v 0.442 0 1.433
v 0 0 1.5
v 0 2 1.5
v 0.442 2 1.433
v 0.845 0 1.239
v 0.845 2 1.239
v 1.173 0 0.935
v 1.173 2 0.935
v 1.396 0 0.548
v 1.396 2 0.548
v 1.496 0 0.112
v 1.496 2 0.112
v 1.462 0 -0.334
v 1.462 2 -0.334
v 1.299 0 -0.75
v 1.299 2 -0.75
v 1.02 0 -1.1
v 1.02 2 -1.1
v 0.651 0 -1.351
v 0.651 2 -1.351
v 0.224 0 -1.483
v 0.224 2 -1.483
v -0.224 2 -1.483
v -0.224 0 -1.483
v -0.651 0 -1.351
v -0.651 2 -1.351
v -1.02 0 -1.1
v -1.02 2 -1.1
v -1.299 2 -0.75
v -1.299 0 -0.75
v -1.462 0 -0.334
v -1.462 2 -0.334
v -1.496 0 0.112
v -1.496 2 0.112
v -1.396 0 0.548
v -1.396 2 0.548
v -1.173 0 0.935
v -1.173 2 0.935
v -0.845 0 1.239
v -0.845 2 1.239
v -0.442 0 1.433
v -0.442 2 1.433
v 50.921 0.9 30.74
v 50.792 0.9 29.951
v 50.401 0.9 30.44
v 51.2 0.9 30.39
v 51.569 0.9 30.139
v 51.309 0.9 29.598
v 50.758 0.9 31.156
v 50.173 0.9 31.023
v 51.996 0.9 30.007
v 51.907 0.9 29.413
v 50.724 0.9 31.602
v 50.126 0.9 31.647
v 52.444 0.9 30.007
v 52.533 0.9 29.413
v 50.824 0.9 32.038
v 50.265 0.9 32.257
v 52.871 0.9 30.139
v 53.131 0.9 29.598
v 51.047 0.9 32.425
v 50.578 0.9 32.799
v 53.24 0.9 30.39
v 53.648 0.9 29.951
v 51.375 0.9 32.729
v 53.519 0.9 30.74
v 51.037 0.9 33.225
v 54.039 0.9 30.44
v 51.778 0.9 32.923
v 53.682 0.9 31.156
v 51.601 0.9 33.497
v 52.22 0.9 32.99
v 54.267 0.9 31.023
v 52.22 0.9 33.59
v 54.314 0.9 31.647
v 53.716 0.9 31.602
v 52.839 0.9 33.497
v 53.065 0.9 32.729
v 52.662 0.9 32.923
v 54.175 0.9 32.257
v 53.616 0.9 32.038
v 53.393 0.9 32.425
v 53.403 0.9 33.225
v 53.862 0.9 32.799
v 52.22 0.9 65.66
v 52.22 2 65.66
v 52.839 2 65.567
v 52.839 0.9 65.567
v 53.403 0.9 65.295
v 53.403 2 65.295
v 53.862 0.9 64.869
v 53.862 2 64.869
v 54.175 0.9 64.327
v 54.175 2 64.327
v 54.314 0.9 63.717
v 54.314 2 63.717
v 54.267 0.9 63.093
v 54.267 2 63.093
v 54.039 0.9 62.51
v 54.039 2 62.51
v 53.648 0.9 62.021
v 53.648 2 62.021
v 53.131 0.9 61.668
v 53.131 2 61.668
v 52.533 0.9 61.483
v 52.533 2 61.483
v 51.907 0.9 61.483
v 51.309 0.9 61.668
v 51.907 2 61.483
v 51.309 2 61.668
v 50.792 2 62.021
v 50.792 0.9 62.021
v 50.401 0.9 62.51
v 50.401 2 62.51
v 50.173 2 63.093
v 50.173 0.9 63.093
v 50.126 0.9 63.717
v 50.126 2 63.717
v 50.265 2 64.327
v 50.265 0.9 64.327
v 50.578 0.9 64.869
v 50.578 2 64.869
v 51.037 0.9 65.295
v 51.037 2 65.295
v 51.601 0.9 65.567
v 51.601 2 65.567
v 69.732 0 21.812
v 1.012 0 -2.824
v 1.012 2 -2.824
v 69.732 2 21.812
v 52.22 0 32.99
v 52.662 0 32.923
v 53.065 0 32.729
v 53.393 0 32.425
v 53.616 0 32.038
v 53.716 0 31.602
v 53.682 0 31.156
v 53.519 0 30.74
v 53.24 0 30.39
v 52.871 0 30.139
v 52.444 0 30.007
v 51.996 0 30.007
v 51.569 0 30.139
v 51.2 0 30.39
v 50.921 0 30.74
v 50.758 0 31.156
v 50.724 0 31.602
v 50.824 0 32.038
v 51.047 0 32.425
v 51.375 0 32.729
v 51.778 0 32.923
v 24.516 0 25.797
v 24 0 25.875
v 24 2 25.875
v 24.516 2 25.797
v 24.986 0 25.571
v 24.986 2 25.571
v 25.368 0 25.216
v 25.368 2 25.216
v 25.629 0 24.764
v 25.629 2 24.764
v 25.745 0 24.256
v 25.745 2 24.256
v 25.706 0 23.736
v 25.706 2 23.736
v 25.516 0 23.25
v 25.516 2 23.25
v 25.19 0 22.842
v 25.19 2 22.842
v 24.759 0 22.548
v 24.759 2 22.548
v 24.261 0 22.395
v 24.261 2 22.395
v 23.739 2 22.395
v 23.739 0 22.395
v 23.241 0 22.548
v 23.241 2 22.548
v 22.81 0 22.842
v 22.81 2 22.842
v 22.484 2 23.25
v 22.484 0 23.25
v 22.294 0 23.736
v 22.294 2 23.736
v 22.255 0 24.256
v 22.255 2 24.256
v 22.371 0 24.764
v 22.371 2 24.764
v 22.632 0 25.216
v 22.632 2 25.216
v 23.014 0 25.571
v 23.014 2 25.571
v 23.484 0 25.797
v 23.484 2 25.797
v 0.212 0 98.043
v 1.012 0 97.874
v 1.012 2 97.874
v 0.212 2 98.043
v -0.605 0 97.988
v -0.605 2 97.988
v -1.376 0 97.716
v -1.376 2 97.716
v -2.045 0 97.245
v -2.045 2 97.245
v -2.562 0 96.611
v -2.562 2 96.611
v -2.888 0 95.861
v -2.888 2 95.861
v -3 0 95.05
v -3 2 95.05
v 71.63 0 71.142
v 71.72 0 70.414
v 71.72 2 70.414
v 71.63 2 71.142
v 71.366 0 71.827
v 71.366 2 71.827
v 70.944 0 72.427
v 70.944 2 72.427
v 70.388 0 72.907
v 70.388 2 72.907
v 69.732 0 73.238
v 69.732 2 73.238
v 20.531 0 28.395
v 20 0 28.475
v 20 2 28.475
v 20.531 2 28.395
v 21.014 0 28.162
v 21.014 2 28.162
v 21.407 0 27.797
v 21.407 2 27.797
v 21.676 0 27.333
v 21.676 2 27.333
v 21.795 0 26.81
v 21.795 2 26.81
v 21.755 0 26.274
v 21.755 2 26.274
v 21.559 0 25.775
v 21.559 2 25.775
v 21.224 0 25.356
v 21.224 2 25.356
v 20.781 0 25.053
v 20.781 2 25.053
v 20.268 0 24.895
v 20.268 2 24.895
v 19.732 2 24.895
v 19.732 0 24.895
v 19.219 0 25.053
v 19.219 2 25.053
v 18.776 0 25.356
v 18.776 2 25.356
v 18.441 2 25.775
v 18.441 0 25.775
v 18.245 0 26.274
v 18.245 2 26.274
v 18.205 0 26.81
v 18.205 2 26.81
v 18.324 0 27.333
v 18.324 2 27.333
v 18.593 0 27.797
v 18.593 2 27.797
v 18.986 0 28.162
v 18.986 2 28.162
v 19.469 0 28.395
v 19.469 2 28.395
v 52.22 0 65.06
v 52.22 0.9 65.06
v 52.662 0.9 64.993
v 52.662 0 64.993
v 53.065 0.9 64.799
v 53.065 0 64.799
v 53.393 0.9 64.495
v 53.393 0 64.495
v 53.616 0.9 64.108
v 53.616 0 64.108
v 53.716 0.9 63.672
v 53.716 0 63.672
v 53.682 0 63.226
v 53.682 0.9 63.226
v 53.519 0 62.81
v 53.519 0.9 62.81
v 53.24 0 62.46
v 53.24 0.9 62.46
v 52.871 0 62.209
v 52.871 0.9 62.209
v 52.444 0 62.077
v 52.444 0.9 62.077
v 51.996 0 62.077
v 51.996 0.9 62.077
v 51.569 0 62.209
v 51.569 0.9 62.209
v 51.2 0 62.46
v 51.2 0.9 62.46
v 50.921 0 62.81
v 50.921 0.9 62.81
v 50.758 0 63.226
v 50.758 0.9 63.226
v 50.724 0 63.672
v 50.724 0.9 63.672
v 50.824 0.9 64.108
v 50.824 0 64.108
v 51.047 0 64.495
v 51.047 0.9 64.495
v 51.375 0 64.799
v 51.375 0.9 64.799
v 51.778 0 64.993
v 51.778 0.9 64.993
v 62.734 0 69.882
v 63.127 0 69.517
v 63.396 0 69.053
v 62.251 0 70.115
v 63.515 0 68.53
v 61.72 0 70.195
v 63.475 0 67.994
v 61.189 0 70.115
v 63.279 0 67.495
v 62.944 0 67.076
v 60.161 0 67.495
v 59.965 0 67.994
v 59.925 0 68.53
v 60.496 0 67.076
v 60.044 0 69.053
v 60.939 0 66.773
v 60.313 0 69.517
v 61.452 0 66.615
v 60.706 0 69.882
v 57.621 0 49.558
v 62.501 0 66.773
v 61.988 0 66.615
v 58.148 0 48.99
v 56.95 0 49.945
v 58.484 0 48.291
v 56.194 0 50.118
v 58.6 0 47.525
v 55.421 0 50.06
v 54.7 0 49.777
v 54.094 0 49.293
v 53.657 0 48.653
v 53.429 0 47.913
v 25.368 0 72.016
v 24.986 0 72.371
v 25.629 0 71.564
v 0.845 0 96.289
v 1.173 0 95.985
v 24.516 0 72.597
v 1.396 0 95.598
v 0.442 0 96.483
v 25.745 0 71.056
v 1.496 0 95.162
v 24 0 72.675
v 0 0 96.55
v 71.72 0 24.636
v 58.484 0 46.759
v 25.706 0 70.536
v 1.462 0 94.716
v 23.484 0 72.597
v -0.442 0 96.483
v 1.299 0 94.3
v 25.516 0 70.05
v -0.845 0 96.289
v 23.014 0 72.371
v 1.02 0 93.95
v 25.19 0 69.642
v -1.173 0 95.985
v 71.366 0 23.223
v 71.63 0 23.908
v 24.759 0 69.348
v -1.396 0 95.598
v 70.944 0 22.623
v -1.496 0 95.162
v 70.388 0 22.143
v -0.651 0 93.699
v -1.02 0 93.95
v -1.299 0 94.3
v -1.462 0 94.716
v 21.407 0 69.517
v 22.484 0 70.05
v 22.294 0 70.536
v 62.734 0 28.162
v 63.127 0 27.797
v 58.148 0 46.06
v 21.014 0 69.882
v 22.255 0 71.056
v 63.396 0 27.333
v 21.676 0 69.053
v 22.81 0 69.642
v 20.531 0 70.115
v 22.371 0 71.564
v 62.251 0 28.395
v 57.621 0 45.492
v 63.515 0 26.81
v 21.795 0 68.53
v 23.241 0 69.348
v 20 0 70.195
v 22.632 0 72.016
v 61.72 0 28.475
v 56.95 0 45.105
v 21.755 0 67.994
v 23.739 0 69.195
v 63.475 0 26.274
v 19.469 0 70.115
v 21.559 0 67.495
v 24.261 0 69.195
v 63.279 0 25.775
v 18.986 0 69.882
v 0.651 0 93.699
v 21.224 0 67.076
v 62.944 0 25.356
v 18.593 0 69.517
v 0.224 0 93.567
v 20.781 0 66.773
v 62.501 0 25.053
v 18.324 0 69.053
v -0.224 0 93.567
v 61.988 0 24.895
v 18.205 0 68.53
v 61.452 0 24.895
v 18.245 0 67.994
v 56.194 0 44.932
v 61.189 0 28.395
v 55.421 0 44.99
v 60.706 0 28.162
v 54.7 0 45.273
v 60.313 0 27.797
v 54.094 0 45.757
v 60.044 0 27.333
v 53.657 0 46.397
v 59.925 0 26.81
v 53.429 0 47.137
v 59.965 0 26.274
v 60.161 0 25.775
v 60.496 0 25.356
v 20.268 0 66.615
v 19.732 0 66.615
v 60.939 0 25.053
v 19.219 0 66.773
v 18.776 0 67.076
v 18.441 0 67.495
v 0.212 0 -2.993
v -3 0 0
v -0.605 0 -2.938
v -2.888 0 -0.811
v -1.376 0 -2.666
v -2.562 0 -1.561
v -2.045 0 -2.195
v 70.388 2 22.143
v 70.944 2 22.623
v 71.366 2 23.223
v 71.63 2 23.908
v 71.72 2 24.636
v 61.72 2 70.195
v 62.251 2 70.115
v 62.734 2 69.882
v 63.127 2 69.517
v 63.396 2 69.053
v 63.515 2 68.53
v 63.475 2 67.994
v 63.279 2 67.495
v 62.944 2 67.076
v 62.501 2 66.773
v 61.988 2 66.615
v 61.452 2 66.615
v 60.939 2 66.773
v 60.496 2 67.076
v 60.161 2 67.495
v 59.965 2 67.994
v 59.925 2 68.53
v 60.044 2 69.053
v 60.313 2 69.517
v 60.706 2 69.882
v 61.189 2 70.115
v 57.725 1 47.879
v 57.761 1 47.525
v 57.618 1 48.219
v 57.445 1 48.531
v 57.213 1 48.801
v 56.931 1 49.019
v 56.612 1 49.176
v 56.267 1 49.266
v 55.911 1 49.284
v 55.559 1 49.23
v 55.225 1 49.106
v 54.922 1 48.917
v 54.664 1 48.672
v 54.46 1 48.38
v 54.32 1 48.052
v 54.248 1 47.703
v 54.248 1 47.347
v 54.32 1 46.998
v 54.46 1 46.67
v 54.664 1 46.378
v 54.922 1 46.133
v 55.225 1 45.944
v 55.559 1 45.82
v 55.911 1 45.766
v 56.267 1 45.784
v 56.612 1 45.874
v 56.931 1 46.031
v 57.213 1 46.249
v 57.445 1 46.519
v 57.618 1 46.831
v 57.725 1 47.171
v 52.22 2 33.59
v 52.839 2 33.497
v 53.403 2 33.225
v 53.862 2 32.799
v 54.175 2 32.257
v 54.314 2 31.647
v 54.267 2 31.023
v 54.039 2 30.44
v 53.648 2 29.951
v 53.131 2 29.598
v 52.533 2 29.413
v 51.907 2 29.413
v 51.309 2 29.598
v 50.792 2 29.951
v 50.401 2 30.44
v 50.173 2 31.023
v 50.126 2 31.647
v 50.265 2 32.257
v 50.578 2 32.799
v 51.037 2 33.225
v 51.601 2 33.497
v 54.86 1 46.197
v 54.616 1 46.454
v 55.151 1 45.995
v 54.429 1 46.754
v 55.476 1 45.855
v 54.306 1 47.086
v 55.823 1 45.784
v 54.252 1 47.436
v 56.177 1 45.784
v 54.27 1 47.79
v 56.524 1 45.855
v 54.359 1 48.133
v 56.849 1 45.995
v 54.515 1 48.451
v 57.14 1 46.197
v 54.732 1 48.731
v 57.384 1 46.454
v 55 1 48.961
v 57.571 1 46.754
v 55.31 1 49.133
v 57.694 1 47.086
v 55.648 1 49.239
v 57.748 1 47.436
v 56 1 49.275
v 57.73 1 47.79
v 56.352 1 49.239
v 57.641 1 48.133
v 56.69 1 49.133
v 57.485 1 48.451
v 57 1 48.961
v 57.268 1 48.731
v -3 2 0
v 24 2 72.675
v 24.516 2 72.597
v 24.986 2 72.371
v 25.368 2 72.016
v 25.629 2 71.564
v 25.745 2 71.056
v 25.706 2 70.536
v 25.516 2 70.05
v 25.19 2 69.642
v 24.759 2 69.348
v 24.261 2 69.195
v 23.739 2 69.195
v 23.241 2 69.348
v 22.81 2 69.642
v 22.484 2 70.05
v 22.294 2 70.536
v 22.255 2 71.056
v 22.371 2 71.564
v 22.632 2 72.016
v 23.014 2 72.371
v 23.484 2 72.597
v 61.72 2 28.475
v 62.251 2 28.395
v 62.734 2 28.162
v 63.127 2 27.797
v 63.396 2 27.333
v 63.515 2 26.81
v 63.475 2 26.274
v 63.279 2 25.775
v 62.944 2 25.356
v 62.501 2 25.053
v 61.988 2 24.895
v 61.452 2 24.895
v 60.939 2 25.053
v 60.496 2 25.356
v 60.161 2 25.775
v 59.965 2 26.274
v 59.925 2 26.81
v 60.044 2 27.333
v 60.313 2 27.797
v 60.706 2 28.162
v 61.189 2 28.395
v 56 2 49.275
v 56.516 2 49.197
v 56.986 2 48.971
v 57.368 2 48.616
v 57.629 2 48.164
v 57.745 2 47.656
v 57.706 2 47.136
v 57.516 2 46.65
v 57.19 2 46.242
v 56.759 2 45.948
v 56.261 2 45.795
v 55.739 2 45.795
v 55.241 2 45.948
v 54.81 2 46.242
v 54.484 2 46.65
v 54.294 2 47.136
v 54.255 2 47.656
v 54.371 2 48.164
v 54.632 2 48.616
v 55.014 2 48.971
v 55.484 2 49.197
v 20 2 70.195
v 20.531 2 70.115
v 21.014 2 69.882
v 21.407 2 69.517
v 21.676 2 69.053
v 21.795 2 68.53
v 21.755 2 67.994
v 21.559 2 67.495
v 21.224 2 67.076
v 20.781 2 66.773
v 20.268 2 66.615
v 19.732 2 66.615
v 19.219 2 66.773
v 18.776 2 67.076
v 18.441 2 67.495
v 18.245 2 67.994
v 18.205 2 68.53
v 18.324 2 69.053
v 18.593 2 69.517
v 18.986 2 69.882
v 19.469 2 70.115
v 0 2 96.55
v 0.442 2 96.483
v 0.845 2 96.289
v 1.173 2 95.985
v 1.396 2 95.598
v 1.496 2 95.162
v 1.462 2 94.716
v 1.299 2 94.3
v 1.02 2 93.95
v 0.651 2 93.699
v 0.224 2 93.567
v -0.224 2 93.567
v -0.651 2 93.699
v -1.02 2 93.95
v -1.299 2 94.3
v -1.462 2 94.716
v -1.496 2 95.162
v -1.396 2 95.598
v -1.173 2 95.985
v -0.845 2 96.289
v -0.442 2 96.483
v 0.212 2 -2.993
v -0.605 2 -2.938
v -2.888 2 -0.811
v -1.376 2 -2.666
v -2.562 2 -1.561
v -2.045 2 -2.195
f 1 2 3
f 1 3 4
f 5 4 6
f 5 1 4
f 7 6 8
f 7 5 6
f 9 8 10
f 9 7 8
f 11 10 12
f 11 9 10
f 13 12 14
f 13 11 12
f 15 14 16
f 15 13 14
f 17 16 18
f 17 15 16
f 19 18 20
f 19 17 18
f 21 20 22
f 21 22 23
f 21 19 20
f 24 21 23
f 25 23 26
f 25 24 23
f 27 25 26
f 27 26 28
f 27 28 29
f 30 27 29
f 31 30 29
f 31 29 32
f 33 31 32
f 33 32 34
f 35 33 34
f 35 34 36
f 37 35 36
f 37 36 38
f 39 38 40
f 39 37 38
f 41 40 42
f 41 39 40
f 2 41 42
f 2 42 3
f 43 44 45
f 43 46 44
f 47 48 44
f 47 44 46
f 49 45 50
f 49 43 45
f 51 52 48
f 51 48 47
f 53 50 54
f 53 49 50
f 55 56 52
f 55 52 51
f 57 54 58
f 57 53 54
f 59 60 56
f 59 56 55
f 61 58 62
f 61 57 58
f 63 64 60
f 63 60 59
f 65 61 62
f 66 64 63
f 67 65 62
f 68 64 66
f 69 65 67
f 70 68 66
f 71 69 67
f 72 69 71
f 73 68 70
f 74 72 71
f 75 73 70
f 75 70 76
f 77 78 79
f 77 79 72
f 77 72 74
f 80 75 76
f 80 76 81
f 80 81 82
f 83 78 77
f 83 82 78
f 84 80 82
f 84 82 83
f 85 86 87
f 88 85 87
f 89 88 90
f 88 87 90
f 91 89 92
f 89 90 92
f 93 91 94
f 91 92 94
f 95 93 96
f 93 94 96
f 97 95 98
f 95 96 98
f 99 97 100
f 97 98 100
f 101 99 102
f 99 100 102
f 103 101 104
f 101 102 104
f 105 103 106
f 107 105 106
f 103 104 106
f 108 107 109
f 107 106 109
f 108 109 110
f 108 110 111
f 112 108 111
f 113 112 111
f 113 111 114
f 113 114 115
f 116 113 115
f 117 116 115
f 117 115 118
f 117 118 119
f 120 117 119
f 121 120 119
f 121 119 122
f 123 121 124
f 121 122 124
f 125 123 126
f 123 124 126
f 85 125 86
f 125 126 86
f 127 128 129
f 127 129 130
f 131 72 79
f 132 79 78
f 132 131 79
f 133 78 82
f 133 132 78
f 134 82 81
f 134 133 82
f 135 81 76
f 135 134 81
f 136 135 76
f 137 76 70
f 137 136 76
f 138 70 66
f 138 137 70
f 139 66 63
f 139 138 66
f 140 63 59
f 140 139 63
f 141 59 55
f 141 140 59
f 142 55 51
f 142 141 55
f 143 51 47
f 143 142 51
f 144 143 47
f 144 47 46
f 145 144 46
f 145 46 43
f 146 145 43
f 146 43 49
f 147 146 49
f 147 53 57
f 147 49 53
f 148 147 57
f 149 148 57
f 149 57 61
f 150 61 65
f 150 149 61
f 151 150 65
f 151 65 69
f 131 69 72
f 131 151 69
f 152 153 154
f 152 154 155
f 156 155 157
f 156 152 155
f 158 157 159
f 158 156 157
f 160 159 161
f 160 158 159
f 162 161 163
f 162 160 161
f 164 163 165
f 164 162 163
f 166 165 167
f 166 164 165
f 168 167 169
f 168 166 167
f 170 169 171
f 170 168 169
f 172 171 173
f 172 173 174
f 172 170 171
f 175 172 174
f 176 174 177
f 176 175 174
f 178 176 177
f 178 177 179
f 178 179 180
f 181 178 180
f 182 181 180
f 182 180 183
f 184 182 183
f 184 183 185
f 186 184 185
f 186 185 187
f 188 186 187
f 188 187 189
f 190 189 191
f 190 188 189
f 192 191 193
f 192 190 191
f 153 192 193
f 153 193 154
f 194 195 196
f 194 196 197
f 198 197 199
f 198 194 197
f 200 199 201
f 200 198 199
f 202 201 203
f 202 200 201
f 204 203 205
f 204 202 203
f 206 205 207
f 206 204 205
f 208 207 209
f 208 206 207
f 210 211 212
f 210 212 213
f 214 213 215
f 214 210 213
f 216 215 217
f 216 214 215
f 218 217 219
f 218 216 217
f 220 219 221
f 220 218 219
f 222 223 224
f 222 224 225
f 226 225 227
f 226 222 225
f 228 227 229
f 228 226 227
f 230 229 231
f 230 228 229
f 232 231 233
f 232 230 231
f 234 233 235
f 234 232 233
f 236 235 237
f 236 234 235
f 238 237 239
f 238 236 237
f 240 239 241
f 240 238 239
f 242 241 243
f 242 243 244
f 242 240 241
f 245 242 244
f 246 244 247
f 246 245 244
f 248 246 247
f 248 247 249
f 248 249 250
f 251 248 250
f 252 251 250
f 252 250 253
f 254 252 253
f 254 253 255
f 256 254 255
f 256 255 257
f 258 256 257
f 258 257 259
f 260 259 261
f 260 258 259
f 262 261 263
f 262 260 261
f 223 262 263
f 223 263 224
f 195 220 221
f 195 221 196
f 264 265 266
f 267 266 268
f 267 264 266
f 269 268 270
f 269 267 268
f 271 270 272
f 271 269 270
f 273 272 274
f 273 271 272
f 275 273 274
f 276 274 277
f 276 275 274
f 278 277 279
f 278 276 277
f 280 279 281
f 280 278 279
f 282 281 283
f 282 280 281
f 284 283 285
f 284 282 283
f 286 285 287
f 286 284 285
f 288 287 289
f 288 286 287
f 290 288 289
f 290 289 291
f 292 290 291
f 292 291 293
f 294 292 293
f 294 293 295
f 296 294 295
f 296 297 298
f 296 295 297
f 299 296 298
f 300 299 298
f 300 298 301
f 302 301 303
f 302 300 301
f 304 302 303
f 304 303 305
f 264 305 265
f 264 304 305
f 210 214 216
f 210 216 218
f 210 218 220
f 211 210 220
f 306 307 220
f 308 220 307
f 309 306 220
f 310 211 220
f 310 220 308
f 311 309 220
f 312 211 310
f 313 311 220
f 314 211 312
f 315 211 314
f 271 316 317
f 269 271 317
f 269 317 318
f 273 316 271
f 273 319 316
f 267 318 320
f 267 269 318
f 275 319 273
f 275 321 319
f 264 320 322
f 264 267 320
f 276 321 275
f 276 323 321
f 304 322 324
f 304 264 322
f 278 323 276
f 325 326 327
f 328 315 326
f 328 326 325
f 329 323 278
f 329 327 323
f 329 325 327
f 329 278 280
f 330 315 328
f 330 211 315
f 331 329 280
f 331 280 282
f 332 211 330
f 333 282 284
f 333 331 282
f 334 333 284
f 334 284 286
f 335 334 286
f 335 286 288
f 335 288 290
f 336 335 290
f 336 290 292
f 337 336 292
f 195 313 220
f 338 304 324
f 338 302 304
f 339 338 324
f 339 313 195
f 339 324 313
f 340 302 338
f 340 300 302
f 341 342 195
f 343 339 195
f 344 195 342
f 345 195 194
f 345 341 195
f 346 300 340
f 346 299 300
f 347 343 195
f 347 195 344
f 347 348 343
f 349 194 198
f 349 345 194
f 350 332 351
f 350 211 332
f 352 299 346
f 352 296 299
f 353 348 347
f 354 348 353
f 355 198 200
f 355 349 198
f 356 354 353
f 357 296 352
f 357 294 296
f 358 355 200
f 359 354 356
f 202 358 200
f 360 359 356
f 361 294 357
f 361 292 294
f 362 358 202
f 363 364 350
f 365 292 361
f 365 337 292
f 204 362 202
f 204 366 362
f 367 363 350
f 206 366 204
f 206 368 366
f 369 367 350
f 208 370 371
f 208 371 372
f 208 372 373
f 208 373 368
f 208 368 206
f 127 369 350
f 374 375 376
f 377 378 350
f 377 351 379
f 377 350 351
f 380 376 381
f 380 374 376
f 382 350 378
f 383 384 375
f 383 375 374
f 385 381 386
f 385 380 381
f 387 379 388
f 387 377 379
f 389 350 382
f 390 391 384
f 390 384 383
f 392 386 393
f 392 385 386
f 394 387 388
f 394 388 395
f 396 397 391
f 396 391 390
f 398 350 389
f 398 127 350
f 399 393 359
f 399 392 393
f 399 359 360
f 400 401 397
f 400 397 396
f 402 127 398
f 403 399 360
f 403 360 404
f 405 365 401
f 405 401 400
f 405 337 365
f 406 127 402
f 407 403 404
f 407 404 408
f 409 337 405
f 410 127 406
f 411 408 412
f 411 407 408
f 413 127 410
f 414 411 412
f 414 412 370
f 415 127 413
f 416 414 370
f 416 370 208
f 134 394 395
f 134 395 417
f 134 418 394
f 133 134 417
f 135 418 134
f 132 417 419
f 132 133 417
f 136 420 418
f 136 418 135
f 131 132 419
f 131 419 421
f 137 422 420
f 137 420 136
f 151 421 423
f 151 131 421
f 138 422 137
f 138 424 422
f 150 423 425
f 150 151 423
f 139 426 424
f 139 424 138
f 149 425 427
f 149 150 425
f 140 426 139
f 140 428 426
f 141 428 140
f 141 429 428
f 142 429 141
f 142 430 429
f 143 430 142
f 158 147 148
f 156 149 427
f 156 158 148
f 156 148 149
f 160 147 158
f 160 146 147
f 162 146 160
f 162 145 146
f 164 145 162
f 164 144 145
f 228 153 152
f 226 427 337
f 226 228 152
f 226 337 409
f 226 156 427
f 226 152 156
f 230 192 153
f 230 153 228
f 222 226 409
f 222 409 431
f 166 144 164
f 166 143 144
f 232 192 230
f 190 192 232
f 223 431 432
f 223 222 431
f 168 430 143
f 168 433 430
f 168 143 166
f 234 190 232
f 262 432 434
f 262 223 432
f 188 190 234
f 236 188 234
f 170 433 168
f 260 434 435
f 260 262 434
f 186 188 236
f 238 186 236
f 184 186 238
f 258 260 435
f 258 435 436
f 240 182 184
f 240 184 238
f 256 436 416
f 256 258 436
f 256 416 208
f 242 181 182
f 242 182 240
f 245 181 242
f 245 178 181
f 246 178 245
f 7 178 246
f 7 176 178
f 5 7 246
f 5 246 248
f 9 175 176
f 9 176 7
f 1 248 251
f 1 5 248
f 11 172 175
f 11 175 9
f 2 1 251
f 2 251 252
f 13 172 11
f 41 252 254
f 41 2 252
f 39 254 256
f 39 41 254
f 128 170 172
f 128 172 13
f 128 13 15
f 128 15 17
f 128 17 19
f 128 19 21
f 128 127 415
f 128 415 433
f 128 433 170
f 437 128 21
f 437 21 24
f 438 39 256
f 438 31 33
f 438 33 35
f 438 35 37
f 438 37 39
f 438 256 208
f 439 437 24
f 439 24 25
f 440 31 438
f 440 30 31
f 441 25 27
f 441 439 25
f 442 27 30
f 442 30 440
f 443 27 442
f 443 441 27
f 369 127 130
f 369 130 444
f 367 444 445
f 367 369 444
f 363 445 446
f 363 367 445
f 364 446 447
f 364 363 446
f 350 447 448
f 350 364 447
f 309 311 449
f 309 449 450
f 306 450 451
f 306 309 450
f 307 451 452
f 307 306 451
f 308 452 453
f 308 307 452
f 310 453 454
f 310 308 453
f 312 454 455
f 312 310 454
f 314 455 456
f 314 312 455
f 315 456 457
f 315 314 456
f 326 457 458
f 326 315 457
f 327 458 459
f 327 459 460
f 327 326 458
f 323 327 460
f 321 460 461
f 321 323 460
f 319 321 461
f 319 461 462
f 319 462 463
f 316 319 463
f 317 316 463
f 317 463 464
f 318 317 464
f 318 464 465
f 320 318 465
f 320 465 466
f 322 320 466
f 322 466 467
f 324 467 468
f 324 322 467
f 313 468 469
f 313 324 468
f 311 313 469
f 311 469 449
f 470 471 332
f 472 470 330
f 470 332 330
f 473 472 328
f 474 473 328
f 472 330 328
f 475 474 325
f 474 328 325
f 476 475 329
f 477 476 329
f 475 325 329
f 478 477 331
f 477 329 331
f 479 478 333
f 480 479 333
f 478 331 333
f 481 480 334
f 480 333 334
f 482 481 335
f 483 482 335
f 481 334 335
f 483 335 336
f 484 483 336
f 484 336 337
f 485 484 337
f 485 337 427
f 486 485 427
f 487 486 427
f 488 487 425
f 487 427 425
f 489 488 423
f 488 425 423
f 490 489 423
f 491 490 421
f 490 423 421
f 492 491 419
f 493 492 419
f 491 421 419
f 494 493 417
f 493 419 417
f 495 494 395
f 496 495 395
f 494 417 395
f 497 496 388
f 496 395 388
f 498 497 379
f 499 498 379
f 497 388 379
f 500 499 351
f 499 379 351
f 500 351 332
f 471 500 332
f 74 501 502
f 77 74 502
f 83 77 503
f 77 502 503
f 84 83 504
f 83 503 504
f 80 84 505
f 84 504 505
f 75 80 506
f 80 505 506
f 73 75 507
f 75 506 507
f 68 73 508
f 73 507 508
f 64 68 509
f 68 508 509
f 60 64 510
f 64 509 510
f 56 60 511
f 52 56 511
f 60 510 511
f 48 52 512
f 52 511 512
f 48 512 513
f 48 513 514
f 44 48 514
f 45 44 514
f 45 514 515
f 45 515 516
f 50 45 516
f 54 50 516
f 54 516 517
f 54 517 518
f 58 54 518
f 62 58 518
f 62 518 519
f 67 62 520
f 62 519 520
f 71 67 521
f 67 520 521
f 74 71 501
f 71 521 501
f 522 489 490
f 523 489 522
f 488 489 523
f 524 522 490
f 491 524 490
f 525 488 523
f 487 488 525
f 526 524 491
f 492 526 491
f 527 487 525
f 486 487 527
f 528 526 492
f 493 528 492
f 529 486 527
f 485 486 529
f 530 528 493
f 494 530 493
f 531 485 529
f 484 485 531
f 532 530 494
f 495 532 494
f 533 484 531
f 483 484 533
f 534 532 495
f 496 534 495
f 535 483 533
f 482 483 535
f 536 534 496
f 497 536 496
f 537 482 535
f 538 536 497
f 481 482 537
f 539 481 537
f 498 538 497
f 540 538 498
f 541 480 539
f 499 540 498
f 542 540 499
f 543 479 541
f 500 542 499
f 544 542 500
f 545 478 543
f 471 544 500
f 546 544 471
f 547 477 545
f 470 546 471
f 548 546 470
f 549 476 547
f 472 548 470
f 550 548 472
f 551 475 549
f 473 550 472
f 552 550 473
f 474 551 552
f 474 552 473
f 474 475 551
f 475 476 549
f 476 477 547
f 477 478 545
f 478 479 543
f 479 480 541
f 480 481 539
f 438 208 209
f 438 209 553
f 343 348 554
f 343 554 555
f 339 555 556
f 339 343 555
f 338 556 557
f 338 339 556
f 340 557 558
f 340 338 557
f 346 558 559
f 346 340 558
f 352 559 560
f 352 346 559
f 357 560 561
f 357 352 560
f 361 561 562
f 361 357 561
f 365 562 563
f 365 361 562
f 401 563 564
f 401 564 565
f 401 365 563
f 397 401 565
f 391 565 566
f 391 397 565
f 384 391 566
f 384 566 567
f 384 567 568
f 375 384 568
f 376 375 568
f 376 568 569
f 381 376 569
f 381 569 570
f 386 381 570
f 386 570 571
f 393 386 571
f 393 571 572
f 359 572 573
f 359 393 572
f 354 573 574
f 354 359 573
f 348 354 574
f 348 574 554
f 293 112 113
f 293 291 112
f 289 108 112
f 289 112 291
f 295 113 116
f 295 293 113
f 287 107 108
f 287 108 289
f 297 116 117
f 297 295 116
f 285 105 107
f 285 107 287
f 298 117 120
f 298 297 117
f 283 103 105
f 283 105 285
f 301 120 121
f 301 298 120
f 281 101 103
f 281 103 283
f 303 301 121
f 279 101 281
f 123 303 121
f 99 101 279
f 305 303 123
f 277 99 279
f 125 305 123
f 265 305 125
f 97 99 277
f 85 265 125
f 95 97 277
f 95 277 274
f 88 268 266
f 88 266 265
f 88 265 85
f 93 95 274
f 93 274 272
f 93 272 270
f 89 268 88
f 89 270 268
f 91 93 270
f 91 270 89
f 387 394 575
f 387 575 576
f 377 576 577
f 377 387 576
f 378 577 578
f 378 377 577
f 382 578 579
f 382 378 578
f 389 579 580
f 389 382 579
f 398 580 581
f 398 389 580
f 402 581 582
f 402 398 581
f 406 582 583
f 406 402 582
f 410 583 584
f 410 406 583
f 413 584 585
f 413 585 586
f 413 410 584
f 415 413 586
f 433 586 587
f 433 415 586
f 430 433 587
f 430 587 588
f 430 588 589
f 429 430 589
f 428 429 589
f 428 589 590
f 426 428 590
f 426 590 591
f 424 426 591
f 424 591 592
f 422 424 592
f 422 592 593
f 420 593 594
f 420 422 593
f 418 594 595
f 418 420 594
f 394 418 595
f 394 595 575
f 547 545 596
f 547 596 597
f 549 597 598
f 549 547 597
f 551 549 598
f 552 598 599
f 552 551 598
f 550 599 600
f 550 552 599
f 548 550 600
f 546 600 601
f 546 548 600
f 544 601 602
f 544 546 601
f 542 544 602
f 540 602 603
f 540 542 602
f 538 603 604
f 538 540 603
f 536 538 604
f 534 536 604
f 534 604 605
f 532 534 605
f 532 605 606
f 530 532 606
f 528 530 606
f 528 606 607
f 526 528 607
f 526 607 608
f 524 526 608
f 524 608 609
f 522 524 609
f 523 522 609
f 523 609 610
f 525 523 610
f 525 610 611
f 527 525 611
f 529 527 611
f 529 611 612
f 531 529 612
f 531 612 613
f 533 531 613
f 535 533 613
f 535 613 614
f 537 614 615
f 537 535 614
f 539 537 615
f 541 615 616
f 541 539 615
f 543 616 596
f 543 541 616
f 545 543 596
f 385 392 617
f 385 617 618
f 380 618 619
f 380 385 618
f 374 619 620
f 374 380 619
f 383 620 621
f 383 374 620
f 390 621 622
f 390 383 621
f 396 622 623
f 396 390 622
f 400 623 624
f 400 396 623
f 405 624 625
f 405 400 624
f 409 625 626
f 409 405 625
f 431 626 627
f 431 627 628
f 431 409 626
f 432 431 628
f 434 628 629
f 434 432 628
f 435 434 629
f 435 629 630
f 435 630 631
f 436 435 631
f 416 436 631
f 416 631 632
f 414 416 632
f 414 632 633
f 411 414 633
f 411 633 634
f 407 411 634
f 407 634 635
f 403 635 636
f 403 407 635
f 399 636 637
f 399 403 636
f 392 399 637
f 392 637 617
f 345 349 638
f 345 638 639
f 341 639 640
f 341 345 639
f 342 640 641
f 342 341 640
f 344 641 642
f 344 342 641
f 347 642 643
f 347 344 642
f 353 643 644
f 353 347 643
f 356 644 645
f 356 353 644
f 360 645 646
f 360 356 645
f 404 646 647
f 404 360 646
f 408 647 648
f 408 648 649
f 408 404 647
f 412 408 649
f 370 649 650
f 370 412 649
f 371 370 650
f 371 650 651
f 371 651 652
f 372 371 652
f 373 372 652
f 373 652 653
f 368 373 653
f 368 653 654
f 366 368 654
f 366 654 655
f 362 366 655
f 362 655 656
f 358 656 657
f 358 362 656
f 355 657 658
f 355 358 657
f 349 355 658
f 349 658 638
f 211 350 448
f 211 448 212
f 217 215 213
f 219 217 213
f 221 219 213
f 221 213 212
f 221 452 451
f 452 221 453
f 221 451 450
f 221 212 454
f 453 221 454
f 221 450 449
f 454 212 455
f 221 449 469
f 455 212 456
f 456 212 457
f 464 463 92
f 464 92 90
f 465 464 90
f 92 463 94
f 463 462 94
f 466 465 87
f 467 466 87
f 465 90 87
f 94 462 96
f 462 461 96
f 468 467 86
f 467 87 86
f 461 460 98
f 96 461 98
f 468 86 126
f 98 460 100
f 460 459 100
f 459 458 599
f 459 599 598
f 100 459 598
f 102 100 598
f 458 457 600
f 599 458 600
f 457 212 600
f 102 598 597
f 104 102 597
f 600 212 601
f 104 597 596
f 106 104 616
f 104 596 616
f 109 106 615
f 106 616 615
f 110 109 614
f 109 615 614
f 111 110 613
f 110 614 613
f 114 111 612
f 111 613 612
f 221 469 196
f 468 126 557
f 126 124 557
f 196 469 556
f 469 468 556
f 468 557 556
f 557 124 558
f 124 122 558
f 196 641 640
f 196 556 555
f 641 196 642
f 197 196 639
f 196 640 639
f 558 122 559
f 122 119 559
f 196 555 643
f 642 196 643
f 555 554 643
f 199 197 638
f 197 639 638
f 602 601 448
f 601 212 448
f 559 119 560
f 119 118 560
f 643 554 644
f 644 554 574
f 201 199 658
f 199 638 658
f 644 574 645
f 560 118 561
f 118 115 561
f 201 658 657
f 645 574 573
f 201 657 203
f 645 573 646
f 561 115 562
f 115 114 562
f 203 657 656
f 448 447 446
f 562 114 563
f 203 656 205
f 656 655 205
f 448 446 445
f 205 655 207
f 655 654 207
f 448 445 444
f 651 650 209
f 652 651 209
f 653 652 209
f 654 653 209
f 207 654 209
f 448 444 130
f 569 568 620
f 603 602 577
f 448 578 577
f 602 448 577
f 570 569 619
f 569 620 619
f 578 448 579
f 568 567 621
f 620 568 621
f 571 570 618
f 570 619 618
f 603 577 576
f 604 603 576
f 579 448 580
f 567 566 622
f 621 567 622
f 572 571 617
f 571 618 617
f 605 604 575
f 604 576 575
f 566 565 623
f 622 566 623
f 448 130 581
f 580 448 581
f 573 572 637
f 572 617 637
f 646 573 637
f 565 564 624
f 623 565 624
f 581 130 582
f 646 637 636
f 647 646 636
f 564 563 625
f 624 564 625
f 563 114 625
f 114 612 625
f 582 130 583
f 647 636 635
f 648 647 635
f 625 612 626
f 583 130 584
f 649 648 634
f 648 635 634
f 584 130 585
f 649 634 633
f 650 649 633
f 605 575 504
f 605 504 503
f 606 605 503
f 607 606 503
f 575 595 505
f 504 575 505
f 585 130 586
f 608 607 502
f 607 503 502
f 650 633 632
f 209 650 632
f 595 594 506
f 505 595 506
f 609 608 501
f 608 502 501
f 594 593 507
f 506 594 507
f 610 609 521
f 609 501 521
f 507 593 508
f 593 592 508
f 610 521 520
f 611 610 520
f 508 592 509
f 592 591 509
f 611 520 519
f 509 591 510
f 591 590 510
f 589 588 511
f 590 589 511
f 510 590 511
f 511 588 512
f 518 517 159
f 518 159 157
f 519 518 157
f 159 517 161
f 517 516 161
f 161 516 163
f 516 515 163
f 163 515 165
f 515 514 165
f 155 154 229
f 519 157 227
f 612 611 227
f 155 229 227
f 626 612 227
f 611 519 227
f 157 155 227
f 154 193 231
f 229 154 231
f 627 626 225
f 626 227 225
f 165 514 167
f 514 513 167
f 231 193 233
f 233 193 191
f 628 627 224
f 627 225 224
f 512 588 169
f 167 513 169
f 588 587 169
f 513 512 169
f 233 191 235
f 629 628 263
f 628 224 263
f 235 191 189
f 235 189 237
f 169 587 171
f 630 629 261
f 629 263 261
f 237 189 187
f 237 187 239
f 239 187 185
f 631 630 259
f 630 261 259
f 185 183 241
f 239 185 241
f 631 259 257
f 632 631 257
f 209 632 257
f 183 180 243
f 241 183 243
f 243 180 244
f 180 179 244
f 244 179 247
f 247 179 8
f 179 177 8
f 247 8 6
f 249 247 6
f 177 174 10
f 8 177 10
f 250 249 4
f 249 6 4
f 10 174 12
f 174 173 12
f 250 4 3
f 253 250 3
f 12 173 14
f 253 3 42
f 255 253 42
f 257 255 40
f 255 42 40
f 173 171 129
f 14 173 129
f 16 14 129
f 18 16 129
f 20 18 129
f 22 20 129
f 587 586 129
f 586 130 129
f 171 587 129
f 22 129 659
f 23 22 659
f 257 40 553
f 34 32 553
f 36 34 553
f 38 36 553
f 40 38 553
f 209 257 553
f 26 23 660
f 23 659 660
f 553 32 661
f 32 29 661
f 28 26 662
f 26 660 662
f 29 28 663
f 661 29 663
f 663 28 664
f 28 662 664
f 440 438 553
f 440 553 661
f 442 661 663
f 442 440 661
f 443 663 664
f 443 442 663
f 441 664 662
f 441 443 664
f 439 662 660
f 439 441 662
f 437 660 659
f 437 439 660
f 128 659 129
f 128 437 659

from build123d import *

# Parameters (mm, degrees)
CROQUIS1_R              = 1.8
CROQUIS1_R_2            = 1.5
CROQUIS1_R_3            = 1.75
SALIENTE_EXTRUIR1_DEPTH = 2
CROQUIS2_R              = 2.6
CORTAR_EXTRUIR1_DEPTH   = 1
CORTAR_EXTRUIR1_DRAFT   = -40
CROQUIS3_R              = 2.1
CORTAR_EXTRUIR2_DEPTH   = 1.1


with BuildPart() as part:
    # Croquis1 → Saliente-Extruir1 (new body)
    with BuildSketch(Plane(origin=(0, 0, 0), x_dir=(1, 0, 0), z_dir=(0, 1, 0))):
        with BuildLine():
            Line((1.012419451, 2.824005463), (69.732419451, -21.812442877))
            ThreePointArc((69.732419451, -21.812442877), (71.173289461, -22.909783687), (71.72, -24.63644834))
            Line((71.72, -24.63644834), (71.72, -70.41355166))
            ThreePointArc((71.72, -70.41355166), (71.173289461, -72.140216313), (69.732419451, -73.237557123))
            Line((69.732419451, -73.237557123), (1.012419451, -97.874005463))
            ThreePointArc((1.012419451, -97.874005463), (-1.726664653, -97.503289461), (-3, -95.05))
            Line((-3, -95.05), (-3, 0))
            ThreePointArc((-3, 0), (-1.726664653, 2.453289461), (1.012419451, 2.824005463))
        make_face()
        with Locations(Location((20, -26.675, 0), (0, 0, 270))):
            Circle(CROQUIS1_R, mode=Mode.SUBTRACT)
        with Locations(Location((20, -68.395, 0), (0, 0, 270))):
            Circle(CROQUIS1_R, mode=Mode.SUBTRACT)
        with Locations(Location((61.72, -26.675, 0), (0, 0, 270))):
            Circle(CROQUIS1_R, mode=Mode.SUBTRACT)
        with Locations(Location((61.72, -68.395, 0), (0, 0, 270))):
            Circle(CROQUIS1_R, mode=Mode.SUBTRACT)
        with Locations(Location((0, 0, 0), (0, 0, 270))):
            Circle(CROQUIS1_R_2, mode=Mode.SUBTRACT)
        with Locations(Location((0, -95.05, 0), (0, 0, 270))):
            Circle(CROQUIS1_R_2, mode=Mode.SUBTRACT)
        with Locations(Location((52.22, -31.49, 0), (0, 0, 270))):
            Circle(CROQUIS1_R_2, mode=Mode.SUBTRACT)
        with Locations(Location((52.22, -63.56, 0), (0, 0, 270))):
            Circle(CROQUIS1_R_2, mode=Mode.SUBTRACT)
        with Locations(Location((24, -70.925, 0), (0, 0, 270))):
            Circle(CROQUIS1_R_3, mode=Mode.SUBTRACT)
        with Locations(Location((24, -24.125, 0), (0, 0, 270))):
            Circle(CROQUIS1_R_3, mode=Mode.SUBTRACT)
        with Locations(Location((56, -47.525, 0), (0, 0, 270))):
            Circle(CROQUIS1_R_3, mode=Mode.SUBTRACT)
    extrude(amount=SALIENTE_EXTRUIR1_DEPTH)


with BuildPart() as cortar_extruir1_tool:
    # Croquis2 → Cortar-Extruir1 (with draft: the straight prism first)
    with BuildSketch(Plane.XZ):
        with Locations((56, 47.525)):
            Circle(CROQUIS2_R)
    extrude(amount=-CORTAR_EXTRUIR1_DEPTH)
    # Cortar-Extruir1: the draft: its side faces are tilted about the plane it starts from
    cortar_extruir1_sides = [cortar_extruir1_tool.faces().sort_by_distance(p)[0] for p in [
        (53.4, 0.5, 47.525),
    ]]
    draft(cortar_extruir1_sides, Plane.XZ, CORTAR_EXTRUIR1_DRAFT)


with BuildPart() as part_1:
    add(part.part)

    # Cortar-Extruir1: cut by cortar_extruir1_tool
    add(cortar_extruir1_tool.part, mode=Mode.SUBTRACT)

    # Croquis3 → Cortar-Extruir2 (cut)
    with BuildSketch(Plane(origin=(0, 2, 0), x_dir=(1, 0, 0), z_dir=(0, 1, 0))):
        with Locations(Location((52.22, -31.49, 0), (0, 0, 270))):
            Circle(CROQUIS3_R)
        with Locations(Location((52.22, -63.56, 0), (0, 0, 270))):
            Circle(CROQUIS3_R)
    extrude(amount=-CORTAR_EXTRUIR2_DEPTH, mode=Mode.SUBTRACT)


solid = part_1.part
